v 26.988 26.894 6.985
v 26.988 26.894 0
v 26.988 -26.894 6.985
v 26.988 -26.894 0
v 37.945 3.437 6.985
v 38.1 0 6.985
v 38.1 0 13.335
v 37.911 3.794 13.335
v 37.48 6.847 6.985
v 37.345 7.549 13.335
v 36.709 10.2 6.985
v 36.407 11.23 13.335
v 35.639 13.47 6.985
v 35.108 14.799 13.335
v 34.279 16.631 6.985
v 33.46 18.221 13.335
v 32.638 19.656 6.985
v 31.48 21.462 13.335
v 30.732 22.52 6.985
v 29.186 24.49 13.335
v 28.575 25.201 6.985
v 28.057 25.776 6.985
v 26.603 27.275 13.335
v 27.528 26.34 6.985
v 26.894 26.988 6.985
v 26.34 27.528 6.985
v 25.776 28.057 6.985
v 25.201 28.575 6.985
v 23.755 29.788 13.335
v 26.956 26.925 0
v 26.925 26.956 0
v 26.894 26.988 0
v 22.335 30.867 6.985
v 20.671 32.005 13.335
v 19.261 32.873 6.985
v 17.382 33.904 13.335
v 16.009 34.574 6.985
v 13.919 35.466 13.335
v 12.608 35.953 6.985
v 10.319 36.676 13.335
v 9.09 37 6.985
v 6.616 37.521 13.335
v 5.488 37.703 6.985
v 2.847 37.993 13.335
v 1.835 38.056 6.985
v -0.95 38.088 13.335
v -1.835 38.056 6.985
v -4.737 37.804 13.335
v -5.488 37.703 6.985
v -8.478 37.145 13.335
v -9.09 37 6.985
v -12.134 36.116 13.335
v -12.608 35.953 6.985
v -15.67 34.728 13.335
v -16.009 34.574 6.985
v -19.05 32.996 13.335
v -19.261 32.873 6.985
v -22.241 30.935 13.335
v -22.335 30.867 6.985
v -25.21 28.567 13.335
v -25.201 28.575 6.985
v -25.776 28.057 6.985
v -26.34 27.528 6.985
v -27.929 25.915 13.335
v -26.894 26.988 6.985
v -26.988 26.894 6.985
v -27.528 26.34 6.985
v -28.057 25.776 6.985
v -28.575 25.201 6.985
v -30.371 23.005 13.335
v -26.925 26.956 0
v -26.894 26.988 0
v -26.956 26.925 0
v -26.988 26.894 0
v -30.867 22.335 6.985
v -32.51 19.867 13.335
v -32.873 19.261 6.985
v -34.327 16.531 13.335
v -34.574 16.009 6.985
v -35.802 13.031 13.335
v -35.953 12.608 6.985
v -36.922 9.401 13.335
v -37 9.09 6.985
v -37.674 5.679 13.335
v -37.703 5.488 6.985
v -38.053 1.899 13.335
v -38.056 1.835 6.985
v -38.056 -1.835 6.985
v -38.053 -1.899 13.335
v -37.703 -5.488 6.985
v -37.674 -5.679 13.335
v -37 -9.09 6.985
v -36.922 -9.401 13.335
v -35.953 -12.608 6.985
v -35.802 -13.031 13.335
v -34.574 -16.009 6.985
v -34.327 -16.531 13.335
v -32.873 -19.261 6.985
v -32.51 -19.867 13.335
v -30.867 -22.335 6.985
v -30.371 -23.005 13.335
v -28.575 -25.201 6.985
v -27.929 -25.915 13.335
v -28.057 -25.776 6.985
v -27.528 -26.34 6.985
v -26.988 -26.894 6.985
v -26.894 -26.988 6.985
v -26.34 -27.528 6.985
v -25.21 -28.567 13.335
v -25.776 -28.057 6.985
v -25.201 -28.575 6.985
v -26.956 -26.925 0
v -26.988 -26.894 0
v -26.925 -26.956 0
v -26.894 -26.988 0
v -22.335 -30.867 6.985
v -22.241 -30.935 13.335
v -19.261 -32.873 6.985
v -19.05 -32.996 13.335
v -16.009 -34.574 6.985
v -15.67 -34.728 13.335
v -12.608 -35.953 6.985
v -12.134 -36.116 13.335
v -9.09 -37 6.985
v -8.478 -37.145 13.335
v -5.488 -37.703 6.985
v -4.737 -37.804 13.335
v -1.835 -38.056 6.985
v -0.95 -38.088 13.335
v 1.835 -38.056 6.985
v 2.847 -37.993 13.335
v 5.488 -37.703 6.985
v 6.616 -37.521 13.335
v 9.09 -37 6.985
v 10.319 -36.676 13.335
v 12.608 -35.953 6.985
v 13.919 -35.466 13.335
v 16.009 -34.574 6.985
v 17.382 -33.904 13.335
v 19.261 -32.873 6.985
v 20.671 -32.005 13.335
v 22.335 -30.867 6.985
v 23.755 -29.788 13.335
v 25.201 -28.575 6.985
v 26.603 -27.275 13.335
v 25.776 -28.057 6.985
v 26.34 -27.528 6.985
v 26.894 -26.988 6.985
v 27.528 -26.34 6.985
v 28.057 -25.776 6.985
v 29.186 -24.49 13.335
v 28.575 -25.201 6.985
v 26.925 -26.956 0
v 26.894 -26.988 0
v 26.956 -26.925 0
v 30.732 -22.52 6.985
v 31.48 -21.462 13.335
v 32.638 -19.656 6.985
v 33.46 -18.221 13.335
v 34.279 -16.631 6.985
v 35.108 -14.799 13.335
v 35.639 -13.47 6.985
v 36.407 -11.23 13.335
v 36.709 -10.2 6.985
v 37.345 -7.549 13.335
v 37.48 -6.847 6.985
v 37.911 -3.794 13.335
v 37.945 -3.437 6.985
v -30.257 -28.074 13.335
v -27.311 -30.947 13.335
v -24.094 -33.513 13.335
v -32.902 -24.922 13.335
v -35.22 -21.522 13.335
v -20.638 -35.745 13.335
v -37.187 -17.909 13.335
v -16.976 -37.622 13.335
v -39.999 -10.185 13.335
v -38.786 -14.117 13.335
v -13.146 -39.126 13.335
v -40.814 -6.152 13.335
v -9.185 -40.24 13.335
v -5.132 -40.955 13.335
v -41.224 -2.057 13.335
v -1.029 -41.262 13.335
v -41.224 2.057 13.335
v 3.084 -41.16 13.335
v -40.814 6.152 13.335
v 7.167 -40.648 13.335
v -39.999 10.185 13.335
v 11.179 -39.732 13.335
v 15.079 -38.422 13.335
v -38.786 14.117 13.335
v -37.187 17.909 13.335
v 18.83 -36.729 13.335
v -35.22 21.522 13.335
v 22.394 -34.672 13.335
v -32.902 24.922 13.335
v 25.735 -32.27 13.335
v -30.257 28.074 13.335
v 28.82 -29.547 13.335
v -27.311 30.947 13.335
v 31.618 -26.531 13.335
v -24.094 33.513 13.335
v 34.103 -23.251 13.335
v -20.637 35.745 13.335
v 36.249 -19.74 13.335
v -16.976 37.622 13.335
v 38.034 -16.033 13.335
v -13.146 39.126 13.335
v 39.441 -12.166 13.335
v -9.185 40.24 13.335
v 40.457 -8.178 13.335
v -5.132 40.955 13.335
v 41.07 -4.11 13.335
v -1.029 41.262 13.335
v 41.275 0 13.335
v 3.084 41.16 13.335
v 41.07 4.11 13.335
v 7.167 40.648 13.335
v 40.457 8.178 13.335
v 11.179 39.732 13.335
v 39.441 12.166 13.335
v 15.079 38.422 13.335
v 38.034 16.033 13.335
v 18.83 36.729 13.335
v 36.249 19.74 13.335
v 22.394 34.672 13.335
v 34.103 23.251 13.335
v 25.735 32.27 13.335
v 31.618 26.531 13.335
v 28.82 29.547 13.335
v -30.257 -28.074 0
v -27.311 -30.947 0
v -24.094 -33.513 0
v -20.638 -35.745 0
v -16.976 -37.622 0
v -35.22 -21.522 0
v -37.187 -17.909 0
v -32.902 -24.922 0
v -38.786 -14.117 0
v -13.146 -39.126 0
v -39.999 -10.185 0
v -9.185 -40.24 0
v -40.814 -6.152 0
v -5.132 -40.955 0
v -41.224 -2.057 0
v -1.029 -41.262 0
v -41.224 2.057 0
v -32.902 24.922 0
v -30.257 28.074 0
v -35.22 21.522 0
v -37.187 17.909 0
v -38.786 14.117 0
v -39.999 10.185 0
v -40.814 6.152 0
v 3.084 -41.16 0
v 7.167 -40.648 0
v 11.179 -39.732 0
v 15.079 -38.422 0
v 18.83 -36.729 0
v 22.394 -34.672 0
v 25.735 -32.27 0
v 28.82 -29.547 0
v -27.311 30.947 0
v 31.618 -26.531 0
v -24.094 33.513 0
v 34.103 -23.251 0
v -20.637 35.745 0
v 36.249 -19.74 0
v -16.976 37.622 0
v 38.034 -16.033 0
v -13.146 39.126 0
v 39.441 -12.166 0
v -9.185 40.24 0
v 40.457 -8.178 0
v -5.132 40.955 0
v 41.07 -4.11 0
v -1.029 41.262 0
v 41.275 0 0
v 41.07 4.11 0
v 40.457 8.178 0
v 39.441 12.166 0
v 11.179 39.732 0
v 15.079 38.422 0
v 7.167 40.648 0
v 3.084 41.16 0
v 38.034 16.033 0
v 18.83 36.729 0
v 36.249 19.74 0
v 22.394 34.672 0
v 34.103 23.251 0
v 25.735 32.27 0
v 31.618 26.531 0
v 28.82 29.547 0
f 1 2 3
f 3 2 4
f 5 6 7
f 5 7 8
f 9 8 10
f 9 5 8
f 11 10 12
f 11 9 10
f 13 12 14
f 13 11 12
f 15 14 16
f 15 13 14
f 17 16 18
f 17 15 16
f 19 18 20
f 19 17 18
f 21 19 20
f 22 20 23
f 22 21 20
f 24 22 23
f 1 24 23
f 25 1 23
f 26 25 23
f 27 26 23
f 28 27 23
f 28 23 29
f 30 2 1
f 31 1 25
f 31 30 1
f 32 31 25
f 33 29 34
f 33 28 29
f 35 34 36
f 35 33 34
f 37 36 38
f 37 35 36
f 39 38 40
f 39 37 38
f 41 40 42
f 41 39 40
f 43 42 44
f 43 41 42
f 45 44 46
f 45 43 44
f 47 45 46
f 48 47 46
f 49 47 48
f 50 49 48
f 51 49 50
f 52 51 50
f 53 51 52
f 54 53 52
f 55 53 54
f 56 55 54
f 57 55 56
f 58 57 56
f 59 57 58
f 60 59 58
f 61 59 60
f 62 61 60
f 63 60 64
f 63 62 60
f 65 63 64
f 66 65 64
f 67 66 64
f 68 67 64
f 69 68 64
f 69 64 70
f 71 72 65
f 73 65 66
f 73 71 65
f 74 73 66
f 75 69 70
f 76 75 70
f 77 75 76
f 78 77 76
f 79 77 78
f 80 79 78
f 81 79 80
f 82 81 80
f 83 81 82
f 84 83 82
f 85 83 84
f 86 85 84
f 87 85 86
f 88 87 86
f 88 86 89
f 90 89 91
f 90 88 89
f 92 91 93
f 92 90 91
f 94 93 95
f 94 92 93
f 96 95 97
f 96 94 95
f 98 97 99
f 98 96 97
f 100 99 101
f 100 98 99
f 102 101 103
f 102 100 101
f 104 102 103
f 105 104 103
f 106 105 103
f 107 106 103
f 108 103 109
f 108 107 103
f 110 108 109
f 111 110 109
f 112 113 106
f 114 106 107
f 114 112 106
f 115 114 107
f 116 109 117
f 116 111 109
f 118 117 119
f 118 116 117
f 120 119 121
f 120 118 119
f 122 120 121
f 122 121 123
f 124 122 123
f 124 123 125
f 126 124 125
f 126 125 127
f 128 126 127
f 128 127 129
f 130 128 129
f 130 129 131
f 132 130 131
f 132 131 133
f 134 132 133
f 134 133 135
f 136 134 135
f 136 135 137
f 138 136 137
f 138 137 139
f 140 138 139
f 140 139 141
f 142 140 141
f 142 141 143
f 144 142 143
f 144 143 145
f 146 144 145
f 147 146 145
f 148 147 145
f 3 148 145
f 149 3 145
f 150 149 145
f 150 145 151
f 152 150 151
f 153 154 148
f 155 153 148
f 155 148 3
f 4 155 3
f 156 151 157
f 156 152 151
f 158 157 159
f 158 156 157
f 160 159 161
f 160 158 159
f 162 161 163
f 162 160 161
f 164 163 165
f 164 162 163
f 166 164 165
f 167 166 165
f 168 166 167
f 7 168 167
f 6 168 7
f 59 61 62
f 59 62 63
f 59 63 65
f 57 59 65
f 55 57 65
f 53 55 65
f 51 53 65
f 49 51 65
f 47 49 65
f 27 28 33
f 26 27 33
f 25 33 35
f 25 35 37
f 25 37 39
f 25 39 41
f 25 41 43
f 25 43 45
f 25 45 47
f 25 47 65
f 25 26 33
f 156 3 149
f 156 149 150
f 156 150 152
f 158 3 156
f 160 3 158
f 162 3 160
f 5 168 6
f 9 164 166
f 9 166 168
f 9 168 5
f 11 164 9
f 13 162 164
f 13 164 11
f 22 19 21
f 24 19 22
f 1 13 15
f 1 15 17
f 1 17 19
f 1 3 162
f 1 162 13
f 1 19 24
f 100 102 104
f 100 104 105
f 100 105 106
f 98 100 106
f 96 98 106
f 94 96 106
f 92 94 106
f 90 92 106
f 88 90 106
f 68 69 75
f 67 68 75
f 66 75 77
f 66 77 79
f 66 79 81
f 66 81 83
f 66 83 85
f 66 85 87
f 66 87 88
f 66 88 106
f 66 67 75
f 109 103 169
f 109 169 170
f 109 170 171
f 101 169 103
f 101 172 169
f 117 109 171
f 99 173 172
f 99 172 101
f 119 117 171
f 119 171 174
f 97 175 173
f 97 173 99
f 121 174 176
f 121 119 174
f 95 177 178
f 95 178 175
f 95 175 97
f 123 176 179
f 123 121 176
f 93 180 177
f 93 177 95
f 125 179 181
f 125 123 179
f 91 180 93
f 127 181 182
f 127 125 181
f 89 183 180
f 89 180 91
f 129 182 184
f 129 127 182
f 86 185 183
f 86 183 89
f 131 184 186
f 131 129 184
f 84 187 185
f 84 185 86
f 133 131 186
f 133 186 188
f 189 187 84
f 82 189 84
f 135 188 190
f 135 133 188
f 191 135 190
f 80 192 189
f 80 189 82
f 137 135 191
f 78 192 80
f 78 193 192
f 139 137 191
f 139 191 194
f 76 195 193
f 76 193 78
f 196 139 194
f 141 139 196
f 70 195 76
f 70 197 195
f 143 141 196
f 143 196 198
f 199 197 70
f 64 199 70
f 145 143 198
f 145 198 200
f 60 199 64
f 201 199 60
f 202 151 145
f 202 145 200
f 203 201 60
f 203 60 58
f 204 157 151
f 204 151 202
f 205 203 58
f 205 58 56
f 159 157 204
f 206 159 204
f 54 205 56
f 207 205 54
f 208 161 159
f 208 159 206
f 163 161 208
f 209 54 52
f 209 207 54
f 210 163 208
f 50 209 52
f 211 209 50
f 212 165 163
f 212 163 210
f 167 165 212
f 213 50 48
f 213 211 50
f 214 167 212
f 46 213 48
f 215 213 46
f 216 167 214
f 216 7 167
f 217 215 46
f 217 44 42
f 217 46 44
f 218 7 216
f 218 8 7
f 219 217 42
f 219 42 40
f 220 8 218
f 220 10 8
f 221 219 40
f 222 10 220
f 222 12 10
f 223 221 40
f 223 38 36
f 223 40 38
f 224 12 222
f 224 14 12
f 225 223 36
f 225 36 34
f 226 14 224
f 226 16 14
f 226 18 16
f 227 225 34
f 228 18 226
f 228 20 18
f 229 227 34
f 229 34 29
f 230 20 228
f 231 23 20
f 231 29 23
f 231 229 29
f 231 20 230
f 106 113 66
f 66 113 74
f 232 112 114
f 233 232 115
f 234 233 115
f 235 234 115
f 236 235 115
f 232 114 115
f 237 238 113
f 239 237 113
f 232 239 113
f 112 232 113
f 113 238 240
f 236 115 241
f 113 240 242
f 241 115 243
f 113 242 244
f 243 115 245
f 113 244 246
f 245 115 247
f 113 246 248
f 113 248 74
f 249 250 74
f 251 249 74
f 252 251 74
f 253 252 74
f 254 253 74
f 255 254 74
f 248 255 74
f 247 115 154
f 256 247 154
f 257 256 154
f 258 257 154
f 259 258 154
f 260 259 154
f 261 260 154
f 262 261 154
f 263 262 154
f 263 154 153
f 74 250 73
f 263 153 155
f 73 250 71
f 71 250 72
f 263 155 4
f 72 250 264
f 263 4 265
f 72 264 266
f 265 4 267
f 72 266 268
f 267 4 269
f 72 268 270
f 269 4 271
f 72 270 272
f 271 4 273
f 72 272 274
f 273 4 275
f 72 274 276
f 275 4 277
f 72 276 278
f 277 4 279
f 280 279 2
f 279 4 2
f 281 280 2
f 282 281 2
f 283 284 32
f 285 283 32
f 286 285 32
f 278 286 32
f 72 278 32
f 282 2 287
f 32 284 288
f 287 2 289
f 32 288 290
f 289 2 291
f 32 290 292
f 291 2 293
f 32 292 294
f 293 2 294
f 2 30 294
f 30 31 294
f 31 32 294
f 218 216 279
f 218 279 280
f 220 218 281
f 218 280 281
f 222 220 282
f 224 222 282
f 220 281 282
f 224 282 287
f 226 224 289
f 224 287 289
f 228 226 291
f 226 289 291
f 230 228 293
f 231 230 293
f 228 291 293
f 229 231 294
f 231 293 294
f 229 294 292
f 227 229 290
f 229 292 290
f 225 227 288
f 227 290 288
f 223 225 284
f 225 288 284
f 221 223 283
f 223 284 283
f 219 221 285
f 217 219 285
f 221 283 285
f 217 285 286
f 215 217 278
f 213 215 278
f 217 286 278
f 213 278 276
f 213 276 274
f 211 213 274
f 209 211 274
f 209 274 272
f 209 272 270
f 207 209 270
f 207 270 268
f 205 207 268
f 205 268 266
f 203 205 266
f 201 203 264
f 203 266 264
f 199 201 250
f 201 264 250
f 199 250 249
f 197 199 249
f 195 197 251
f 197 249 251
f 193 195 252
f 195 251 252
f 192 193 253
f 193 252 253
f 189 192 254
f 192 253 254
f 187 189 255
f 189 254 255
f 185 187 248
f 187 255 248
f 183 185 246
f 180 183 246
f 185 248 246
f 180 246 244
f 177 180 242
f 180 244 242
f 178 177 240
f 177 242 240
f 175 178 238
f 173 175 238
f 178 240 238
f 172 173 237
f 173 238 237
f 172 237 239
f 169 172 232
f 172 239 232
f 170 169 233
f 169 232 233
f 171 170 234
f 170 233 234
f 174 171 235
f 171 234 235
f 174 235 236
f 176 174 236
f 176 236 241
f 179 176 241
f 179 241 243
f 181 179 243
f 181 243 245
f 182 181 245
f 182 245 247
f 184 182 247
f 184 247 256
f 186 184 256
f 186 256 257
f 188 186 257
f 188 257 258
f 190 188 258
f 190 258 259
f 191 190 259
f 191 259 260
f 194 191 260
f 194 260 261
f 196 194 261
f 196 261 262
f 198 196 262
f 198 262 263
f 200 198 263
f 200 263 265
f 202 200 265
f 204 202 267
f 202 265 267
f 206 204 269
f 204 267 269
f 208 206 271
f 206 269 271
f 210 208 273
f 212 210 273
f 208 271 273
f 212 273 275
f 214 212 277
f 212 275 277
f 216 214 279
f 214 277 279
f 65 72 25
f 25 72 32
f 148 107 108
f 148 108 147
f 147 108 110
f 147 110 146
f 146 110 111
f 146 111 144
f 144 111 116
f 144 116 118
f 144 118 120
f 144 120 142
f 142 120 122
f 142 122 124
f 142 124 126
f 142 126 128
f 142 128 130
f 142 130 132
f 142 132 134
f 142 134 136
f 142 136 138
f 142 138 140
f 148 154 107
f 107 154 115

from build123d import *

# Parameters (mm, degrees)
F0_R     = 41.275
F0_R_2   = 38.1
F2_DEPTH = 13.335
F3_DEPTH = 6.985


with BuildPart() as f2:
    # F0 (on Top) → F2 (new body)
    with BuildSketch(Plane.XY):
        Circle(F0_R)
        Circle(F0_R_2, mode=Mode.SUBTRACT)
    extrude(amount=F2_DEPTH)

    # F1 (on face) → F3 (join)
    with BuildSketch(Plane.XY):
        with BuildLine():
            ThreePointArc((-26.9875, 26.8939555244), (-27.7941461706, 26.0594596768), (-28.575, 25.2007812379))
            Line((-28.575, 25.2007812379), (-28.575, -25.2007812379))
            ThreePointArc((-28.575, -25.2007812379), (-27.7941461706, -26.0594596768), (-26.9875, -26.8939555244))
            Line((-26.9875, -26.8939555244), (-26.9875, 26.8939555244))
        make_face()
        with BuildLine():
            ThreePointArc((26.8939555244, 26.9875), (26.0594596768, 27.7941461706), (25.2007812379, 28.575))
            Line((25.2007812379, 28.575), (-25.2007812379, 28.575))
            ThreePointArc((-25.2007812379, 28.575), (-26.0594596768, 27.7941461706), (-26.8939555244, 26.9875))
            Line((-26.8939555244, 26.9875), (26.8939555244, 26.9875))
        make_face()
        with BuildLine():
            Line((28.575, -25.2007812379), (28.575, 25.2007812379))
            ThreePointArc((28.575, 25.2007812379), (27.7941461706, 26.0594596768), (26.9875, 26.8939555244))
            Line((26.9875, 26.8939555244), (26.9875, -26.8939555244))
            ThreePointArc((26.9875, -26.8939555244), (27.7941461706, -26.0594596768), (28.575, -25.2007812379))
        make_face()
        with BuildLine():
            Line((-25.2007812379, -28.575), (25.2007812379, -28.575))
            ThreePointArc((25.2007812379, -28.575), (26.0594596768, -27.7941461706), (26.8939555244, -26.9875))
            Line((26.8939555244, -26.9875), (-26.8939555244, -26.9875))
            ThreePointArc((-26.8939555244, -26.9875), (-26.0594596768, -27.7941461706), (-25.2007812379, -28.575))
        make_face()
        with BuildLine():
            Line((-25.2007812379, 28.575), (25.2007812379, 28.575))
            ThreePointArc((25.2007812379, 28.575), (0, 38.1), (-25.2007812379, 28.575))
        make_face()
        with BuildLine():
            Line((-28.575, -25.2007812379), (-28.575, 25.2007812379))
            ThreePointArc((-28.575, 25.2007812379), (-38.1, 0), (-28.575, -25.2007812379))
        make_face()
        with BuildLine():
            ThreePointArc((-25.2007812379, -28.575), (0, -38.1), (25.2007812379, -28.575))
            Line((25.2007812379, -28.575), (-25.2007812379, -28.575))
        make_face()
        with BuildLine():
            ThreePointArc((38.1, 0), (35.639286609, 13.4703841816), (28.575, 25.2007812379))
            Line((28.575, 25.2007812379), (28.575, -25.2007812379))
            ThreePointArc((28.575, -25.2007812379), (35.639286609, -13.4703841816), (38.1, 0))
        make_face()
    extrude(amount=F3_DEPTH)


solid = f2.part
